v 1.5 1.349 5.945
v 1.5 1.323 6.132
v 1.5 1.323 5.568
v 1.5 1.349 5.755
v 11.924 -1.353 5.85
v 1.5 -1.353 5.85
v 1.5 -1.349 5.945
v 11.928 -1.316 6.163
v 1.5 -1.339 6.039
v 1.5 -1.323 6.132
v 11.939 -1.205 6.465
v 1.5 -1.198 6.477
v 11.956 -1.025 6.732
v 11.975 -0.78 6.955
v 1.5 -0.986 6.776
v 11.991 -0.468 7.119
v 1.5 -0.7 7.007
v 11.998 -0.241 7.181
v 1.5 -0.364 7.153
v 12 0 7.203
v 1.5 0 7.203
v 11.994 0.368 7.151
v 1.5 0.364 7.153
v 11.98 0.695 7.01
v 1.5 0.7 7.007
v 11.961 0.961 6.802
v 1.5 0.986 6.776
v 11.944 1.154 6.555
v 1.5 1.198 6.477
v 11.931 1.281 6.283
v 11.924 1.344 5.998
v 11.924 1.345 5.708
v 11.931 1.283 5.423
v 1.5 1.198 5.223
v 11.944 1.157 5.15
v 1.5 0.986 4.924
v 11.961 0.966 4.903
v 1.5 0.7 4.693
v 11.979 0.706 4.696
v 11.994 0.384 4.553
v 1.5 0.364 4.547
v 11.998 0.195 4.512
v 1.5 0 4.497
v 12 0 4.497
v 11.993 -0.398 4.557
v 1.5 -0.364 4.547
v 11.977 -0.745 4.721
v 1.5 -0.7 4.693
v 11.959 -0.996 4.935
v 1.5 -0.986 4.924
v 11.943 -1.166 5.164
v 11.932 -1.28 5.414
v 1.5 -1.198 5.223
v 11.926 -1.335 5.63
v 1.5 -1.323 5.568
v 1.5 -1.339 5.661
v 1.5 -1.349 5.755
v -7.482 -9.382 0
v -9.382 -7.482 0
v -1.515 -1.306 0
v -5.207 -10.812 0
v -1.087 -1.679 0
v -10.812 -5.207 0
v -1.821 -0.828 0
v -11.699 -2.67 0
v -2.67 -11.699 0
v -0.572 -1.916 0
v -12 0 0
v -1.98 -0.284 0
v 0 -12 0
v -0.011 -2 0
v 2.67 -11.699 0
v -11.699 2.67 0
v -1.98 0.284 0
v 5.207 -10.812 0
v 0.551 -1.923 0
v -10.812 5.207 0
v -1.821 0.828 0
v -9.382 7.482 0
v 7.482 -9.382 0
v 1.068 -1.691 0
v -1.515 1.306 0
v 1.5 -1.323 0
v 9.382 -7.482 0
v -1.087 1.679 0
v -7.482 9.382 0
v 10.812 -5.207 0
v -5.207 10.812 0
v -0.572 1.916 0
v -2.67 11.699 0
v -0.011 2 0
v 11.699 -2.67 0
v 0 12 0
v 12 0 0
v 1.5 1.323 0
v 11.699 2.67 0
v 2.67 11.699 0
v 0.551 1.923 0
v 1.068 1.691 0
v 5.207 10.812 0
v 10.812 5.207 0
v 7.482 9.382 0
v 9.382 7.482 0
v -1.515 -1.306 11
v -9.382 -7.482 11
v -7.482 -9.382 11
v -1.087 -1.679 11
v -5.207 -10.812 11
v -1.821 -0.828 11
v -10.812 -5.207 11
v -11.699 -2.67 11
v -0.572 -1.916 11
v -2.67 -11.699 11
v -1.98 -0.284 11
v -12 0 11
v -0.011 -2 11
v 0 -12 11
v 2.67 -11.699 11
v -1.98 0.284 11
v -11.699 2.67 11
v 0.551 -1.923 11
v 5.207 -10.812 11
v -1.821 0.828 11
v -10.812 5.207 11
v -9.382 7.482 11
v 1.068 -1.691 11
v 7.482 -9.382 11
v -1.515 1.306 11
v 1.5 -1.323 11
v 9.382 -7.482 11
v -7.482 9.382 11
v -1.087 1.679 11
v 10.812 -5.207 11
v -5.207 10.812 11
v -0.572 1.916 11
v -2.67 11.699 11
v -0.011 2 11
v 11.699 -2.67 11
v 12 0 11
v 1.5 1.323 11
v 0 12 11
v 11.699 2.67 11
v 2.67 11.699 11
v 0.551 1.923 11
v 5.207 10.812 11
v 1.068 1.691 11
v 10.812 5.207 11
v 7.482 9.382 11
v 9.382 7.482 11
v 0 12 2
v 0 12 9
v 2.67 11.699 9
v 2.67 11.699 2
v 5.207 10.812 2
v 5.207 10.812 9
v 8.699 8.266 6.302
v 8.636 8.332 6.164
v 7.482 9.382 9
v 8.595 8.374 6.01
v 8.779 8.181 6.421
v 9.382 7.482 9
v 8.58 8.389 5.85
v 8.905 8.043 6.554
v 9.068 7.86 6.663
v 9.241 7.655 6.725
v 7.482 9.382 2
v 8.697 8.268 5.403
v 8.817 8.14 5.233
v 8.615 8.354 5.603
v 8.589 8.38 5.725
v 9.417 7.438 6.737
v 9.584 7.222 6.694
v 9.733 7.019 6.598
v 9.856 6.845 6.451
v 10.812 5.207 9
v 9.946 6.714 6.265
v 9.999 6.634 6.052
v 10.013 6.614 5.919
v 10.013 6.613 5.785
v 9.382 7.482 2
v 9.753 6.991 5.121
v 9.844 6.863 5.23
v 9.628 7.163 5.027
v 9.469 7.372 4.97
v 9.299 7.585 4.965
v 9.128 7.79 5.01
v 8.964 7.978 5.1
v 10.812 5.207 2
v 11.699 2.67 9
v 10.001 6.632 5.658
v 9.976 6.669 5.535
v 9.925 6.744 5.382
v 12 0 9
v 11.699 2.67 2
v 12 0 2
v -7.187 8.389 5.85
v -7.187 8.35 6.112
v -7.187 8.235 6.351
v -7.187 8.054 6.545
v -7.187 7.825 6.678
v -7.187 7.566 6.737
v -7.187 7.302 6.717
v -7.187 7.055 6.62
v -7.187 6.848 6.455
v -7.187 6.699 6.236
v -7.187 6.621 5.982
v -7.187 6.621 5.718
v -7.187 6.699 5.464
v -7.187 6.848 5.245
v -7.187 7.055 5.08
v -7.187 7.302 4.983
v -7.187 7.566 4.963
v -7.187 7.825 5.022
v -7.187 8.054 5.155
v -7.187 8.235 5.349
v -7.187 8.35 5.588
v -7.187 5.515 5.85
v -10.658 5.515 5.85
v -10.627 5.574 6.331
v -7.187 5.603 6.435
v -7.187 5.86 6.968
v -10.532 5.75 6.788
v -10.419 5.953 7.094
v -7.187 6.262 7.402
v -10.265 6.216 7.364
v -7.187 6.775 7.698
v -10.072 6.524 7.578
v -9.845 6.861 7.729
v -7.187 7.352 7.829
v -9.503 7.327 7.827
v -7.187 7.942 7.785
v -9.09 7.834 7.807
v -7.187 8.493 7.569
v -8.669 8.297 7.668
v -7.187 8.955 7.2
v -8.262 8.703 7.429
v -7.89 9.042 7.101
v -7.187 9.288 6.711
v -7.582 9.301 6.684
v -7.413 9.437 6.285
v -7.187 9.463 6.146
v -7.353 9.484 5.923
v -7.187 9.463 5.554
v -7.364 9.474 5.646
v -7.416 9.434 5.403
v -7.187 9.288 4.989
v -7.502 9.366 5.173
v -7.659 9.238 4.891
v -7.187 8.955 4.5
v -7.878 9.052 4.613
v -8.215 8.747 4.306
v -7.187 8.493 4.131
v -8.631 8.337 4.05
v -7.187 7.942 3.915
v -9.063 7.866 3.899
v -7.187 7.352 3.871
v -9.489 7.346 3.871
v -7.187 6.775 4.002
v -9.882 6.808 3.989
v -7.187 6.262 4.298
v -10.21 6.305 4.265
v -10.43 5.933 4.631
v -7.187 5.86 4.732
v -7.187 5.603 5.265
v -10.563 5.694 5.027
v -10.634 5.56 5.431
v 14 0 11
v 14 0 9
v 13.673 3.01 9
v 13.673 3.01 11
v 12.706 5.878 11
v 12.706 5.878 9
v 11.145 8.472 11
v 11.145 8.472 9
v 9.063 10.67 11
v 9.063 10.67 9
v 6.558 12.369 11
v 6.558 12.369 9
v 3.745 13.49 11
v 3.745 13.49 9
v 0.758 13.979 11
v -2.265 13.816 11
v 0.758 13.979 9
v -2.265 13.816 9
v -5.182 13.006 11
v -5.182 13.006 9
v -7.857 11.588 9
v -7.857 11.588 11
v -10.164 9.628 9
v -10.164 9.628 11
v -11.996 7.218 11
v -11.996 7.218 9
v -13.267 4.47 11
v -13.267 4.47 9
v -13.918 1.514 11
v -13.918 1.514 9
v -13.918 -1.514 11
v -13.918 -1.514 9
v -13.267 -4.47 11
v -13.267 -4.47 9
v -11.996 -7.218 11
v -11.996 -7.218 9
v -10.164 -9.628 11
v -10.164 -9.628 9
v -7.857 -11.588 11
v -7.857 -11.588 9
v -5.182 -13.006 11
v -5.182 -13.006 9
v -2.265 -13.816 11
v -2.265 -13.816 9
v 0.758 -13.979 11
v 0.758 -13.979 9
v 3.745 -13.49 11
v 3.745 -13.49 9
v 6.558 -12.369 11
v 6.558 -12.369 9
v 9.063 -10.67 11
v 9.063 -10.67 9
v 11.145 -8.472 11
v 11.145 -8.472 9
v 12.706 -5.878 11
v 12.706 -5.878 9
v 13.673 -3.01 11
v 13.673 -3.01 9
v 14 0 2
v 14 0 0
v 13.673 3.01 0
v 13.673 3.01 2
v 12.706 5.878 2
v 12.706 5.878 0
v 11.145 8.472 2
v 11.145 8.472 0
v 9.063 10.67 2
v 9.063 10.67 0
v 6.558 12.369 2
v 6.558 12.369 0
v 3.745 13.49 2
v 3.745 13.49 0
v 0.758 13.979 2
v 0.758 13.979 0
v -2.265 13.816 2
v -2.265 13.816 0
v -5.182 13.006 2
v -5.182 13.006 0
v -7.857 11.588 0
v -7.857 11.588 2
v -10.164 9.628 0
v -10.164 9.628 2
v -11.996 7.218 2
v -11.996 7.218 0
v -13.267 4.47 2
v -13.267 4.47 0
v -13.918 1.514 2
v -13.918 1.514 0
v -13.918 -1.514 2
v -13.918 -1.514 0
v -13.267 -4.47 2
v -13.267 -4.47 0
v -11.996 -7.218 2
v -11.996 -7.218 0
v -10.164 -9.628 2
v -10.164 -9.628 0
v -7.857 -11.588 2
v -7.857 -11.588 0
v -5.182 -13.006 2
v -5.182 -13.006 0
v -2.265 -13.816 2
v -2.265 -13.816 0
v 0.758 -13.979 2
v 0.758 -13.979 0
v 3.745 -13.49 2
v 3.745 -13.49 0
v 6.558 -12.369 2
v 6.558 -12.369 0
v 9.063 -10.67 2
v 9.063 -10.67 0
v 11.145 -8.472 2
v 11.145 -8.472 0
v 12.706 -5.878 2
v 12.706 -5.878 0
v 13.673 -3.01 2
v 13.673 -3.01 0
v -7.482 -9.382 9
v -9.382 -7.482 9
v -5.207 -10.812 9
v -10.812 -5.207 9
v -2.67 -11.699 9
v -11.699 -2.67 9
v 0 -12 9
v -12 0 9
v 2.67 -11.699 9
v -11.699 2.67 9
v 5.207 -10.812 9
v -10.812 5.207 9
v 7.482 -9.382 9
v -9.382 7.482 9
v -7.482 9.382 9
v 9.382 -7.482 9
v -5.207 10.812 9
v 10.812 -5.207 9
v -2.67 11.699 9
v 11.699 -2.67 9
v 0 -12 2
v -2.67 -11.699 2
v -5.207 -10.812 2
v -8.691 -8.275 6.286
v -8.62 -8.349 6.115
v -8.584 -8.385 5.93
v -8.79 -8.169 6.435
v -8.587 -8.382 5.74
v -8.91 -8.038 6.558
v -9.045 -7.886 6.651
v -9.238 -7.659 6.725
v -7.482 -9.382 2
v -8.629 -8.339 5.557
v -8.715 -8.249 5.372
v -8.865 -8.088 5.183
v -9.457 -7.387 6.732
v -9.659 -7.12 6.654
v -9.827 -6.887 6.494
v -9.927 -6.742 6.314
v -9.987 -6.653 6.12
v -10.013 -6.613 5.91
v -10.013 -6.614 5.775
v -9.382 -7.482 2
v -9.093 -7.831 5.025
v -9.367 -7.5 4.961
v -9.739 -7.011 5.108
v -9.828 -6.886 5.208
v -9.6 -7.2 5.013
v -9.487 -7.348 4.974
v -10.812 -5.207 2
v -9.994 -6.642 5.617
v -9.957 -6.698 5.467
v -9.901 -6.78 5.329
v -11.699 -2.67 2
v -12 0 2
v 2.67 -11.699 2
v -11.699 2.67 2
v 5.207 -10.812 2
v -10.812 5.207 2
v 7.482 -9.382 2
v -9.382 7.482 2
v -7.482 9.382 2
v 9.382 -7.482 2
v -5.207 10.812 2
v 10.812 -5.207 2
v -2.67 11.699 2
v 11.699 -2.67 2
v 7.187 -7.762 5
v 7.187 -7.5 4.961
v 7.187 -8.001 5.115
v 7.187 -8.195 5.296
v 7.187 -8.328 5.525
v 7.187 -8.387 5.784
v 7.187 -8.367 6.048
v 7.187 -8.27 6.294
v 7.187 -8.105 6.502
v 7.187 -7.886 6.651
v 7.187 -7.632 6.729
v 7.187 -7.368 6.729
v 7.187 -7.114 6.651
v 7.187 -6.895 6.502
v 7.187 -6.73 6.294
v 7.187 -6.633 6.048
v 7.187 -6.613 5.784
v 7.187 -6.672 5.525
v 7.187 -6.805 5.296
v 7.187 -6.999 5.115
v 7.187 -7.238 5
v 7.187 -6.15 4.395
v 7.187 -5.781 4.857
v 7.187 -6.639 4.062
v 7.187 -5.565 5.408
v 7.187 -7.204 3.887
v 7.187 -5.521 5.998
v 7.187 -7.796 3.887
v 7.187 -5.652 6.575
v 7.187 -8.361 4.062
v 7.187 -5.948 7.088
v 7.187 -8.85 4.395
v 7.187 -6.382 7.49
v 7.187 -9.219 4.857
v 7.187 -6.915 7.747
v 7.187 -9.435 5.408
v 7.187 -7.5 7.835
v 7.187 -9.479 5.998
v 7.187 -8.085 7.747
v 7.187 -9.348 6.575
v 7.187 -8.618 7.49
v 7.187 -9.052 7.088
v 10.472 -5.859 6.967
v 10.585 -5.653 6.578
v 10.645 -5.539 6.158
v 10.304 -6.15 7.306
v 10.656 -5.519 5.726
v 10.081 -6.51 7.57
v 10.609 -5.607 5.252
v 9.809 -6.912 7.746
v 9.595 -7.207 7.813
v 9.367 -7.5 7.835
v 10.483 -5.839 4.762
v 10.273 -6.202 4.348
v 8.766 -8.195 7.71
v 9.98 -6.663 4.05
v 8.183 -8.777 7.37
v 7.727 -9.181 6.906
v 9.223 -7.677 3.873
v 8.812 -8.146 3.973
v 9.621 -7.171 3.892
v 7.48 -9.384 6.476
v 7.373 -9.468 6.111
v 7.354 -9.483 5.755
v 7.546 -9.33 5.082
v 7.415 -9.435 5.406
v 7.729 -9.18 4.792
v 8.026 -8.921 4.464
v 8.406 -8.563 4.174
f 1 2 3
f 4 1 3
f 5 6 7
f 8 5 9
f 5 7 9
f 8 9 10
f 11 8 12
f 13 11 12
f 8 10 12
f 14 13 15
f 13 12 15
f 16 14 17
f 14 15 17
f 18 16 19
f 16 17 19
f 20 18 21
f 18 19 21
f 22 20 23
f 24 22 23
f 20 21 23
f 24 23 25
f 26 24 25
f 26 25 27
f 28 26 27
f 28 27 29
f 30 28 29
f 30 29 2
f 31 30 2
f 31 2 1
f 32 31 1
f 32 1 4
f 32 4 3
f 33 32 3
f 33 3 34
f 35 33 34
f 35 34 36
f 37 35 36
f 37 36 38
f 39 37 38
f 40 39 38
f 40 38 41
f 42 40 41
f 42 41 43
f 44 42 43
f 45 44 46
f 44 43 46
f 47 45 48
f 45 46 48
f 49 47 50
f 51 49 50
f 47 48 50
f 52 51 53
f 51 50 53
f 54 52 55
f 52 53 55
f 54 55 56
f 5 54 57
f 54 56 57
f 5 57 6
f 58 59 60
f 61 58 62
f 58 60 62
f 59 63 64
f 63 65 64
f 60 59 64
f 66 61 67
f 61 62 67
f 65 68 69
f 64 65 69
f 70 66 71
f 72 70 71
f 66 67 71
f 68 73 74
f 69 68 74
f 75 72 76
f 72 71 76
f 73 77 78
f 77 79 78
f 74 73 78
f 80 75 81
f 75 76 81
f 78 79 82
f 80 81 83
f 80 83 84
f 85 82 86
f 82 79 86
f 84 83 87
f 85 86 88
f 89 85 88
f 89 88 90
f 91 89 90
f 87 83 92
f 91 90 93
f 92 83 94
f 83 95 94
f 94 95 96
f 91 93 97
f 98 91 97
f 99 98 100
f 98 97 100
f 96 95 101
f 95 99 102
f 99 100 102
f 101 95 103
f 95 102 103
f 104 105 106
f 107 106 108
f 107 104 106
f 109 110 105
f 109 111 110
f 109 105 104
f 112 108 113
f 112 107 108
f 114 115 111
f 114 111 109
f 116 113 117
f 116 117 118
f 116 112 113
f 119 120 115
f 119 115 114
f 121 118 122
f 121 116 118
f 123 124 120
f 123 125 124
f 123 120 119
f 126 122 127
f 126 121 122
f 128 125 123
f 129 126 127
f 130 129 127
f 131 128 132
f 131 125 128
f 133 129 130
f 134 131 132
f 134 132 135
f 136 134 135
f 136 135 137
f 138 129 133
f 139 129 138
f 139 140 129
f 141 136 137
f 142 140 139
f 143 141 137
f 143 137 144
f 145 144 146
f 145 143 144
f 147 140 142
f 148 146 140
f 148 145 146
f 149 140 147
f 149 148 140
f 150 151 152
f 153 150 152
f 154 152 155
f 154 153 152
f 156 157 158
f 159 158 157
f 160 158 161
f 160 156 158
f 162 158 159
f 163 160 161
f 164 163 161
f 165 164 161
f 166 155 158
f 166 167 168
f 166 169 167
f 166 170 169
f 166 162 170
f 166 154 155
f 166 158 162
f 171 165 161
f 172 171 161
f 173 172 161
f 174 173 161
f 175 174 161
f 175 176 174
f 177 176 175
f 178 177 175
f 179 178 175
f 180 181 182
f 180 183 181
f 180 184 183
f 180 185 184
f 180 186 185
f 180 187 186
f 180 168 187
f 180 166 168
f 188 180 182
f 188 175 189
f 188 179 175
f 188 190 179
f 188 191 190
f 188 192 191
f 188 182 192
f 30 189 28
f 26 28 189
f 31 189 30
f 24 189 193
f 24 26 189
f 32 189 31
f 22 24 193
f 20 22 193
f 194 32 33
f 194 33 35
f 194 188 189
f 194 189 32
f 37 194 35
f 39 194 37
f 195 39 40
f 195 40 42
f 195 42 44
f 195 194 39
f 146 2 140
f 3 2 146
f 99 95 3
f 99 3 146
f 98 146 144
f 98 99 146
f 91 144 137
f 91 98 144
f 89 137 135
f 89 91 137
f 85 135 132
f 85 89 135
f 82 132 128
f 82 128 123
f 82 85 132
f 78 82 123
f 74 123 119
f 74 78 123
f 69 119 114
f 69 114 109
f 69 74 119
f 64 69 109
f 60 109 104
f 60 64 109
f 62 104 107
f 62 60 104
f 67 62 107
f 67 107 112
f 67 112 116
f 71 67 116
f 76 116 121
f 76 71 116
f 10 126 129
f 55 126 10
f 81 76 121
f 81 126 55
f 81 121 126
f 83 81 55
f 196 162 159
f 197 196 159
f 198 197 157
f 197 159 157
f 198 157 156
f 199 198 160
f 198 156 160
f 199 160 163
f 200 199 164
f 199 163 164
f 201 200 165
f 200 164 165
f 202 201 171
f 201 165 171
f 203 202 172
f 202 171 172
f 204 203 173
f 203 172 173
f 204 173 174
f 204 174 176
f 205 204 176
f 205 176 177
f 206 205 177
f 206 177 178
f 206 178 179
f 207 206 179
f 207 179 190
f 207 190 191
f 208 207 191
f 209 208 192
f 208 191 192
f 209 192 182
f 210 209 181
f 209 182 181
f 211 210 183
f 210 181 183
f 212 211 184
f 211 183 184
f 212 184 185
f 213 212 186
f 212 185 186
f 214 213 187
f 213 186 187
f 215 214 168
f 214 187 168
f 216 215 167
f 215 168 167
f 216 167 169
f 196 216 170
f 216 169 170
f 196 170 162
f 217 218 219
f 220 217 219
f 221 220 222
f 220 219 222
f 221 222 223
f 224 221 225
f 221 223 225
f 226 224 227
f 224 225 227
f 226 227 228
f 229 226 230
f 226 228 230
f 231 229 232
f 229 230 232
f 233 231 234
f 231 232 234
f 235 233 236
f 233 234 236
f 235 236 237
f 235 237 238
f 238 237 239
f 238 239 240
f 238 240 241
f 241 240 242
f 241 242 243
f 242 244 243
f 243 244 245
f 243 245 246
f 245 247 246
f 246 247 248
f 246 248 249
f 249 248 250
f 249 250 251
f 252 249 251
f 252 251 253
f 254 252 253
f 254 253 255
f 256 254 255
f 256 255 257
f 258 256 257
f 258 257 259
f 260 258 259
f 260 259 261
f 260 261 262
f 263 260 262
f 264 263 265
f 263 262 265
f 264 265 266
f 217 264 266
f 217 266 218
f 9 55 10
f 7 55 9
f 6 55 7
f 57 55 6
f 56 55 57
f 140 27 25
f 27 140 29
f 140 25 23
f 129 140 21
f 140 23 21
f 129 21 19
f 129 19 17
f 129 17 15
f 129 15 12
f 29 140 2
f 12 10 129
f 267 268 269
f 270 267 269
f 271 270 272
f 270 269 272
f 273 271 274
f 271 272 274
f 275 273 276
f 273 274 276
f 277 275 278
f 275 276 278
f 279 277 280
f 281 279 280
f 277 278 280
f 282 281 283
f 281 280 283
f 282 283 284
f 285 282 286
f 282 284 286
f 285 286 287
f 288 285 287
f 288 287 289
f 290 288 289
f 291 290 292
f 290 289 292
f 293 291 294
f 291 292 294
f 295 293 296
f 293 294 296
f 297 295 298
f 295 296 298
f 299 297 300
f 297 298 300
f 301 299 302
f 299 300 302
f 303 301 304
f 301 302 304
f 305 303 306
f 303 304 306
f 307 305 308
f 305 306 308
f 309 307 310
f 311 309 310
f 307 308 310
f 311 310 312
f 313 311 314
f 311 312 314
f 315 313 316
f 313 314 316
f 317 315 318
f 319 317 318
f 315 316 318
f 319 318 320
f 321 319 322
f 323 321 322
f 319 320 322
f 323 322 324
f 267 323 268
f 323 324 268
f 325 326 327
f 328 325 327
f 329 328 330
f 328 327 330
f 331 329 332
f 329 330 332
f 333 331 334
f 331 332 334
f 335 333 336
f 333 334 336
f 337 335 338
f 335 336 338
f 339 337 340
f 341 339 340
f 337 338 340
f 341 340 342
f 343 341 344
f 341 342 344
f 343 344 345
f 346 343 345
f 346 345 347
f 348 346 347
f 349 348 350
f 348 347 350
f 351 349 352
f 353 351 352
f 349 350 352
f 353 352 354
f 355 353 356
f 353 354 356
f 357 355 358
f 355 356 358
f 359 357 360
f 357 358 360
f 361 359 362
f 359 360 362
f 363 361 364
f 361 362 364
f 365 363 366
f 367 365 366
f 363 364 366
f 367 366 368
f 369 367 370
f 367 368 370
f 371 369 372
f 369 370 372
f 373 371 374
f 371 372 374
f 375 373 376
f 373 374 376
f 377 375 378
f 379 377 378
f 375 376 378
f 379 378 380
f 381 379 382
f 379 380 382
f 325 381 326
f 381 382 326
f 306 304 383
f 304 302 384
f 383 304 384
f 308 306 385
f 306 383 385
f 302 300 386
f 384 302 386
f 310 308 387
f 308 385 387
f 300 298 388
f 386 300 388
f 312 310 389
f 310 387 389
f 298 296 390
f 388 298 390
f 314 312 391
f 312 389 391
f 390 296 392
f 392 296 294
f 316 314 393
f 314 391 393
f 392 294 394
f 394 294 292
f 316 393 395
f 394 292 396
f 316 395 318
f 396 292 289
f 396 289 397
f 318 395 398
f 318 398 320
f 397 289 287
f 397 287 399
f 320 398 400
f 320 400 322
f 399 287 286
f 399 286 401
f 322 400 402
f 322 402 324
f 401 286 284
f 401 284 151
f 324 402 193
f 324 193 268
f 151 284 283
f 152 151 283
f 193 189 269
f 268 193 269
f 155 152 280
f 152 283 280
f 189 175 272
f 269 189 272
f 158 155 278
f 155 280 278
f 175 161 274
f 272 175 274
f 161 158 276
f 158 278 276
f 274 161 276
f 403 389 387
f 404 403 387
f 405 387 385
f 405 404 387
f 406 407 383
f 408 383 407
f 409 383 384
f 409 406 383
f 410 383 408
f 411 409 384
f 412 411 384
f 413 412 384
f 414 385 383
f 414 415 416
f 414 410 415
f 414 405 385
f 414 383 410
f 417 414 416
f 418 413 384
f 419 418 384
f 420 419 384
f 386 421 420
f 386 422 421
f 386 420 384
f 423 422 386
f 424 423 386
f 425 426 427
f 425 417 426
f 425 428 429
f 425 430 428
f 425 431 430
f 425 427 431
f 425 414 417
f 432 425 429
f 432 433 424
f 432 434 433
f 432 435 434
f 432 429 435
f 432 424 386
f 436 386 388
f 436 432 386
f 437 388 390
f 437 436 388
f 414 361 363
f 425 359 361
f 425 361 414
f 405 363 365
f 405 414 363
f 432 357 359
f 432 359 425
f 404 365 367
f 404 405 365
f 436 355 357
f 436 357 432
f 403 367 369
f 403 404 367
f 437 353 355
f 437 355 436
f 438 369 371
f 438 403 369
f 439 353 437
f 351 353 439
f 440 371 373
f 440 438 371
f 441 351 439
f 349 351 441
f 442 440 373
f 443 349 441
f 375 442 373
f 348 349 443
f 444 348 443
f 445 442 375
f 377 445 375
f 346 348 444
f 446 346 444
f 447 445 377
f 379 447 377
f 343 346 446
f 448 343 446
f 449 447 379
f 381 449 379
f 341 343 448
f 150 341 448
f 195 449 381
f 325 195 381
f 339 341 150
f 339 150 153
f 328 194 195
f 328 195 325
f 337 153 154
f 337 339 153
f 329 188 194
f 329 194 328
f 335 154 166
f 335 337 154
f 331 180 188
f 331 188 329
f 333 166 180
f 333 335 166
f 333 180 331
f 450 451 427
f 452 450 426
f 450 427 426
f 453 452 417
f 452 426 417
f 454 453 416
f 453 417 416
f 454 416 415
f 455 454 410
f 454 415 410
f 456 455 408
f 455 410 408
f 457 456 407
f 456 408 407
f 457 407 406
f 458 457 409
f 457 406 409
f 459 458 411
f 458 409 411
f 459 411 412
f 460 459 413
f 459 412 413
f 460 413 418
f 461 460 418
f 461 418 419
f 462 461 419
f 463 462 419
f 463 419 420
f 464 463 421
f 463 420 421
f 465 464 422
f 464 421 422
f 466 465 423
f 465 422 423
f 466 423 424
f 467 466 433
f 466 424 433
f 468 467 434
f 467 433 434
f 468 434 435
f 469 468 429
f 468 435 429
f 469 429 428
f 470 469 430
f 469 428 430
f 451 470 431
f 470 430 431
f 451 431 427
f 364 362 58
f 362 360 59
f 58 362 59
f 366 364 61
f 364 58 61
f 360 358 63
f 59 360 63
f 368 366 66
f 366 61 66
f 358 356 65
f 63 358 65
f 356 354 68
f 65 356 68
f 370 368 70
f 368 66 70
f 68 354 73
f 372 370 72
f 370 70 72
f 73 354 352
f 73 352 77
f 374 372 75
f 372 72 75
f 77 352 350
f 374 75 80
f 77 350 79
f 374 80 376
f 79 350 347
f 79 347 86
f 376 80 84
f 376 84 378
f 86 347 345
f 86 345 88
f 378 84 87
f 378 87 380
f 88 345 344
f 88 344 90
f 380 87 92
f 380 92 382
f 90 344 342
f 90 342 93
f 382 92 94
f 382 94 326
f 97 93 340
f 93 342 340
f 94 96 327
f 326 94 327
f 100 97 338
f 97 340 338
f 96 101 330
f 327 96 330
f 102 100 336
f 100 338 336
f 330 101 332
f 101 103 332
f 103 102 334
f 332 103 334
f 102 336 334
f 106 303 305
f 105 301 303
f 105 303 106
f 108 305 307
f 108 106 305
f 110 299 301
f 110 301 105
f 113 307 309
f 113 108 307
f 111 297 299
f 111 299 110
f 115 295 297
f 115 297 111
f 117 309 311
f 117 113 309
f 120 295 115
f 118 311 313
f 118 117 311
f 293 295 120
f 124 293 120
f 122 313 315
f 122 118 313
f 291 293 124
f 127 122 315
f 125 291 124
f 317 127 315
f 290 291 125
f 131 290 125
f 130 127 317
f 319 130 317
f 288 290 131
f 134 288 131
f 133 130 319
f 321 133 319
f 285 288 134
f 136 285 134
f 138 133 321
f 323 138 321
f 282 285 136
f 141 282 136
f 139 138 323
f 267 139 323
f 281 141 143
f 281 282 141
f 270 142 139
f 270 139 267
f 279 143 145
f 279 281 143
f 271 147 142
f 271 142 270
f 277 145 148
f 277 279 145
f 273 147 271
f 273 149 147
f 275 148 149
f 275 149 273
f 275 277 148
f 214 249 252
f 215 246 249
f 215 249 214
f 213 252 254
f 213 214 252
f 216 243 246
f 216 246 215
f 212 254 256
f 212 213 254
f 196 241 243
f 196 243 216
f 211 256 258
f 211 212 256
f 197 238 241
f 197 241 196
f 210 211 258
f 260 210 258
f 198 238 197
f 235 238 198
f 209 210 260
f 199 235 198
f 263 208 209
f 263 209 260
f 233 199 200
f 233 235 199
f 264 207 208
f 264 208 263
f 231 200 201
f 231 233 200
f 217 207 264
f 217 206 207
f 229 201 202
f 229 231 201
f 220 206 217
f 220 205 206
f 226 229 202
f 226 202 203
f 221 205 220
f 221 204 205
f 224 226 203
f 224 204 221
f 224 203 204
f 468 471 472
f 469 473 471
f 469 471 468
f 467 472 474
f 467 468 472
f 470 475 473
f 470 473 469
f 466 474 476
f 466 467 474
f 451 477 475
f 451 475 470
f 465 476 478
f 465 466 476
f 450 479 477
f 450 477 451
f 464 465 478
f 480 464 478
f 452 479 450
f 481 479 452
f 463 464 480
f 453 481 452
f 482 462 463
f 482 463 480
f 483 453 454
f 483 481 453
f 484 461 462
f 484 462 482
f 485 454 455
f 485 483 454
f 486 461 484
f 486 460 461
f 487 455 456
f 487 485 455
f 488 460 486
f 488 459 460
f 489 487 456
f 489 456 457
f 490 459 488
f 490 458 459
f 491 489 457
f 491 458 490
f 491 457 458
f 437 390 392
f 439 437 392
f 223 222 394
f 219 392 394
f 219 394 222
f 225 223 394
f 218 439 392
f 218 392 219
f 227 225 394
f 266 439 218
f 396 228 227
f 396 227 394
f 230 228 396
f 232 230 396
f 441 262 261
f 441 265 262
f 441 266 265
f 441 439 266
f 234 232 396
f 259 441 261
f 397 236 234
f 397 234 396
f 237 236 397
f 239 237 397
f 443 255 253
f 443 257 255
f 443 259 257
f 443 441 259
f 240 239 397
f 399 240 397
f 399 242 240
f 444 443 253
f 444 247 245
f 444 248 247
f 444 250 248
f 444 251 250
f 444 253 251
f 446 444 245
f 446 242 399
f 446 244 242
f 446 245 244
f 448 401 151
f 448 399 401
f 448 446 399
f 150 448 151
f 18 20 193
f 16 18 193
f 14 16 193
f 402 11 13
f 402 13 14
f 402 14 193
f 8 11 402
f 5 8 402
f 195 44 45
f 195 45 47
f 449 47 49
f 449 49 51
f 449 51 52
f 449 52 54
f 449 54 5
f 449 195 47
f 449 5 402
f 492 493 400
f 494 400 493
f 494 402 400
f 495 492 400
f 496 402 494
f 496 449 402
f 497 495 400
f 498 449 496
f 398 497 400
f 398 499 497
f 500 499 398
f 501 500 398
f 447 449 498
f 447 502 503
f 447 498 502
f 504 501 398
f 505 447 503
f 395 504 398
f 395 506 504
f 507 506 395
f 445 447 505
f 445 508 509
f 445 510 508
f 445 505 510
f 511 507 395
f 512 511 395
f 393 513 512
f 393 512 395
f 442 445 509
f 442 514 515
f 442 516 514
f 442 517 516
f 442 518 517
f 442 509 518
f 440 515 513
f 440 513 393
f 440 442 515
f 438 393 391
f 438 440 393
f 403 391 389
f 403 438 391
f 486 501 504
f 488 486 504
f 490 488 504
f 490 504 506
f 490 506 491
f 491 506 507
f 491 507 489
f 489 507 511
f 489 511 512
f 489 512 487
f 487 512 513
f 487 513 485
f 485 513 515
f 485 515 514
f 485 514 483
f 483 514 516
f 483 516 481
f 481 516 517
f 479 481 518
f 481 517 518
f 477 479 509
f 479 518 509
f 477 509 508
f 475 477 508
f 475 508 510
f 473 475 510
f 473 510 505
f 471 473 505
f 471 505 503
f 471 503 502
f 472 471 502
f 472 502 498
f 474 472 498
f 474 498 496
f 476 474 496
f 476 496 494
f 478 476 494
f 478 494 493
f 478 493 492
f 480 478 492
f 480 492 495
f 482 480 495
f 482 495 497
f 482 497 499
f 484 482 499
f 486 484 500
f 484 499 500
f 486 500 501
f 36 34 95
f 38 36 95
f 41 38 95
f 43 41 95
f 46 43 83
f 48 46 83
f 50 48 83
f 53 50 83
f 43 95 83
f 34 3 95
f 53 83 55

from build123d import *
from build123d.topology import SkipClean

# Parameters (mm, degrees)
SKETCH1_R                                           = 12
SKETCH1_R_2                                         = 2
SQUARE_BODY_DEPTH                                   = 11
CBORE_FOR_0_BINDING_HEAD_MACHINE_SCREW1_D           = 1.778
CBORE_FOR_0_BINDING_HEAD_MACHINE_SCREW1_CBORE_D     = 3.97002
CBORE_FOR_0_BINDING_HEAD_MACHINE_SCREW1_CBORE_DEPTH = 4.812792
CBORE_FOR_0_BINDING_HEAD_MACHINE_SC_2_D             = 1.778
CBORE_FOR_0_BINDING_HEAD_MACHINE_SC_2_CBORE_D       = 3.97002
CBORE_FOR_0_BINDING_HEAD_MACHINE_SC_2_CBORE_DEPTH   = 4.812792
F_6_32_TAPPED_HOLE2_D                               = 2.7051
F_6_32_TAPPED_HOLE2_DEPTH                           = 10.5
CENTER_SPINDLE_DEPTH                                = 21.223748416
SKETCH1_3_R                                         = 14
SKETCH1_3_R_2                                       = 12
TOP_FLANGE_DEPTH                                    = 2
BOTTOM_START                                        = 9
SKETCH1_4_R                                         = 14
SKETCH1_4_R_2                                       = 12
BOTTOM_FLANGE_DEPTH                                 = 2


with BuildPart() as part:
    # Sketch1 → Square Body (new body)
    # profile 1 of 10: a face of its own
    with BuildSketch(Plane.XY):
        Circle(SKETCH1_R)
        Circle(SKETCH1_R_2, mode=Mode.SUBTRACT)
    # profile 2 of 10: a face of its own
    with BuildSketch(Plane.XY):
        with BuildLine():
            Line((-12, 7.211102551), (-12, 0))
            ThreePointArc((-12, 0), (-8.485281374, 8.485281374), (0, 12))
            Line((0, 12), (-7.211102551, 12))
            ThreePointArc((-7.211102551, 12), (-9.899494937, 9.899494937), (-12, 7.211102551))
        make_face()
    # profile 3 of 10: a face of its own
    with BuildSketch(Plane.XY):
        with BuildLine():
            Line((-12, 12), (-12, 7.211102551))
            ThreePointArc((-12, 7.211102551), (-9.899494937, 9.899494937), (-7.211102551, 12))
            Line((-7.211102551, 12), (-12, 12))
        make_face()
    # profile 4 of 10: a face of its own
    with BuildSketch(Plane.XY):
        with BuildLine():
            ThreePointArc((0, -12), (-8.485281374, -8.485281374), (-12, 0))
            Line((-12, 0), (-12, -7.211102551))
            ThreePointArc((-12, -7.211102551), (-9.899494937, -9.899494937), (-7.211102551, -12))
            Line((-7.211102551, -12), (0, -12))
        make_face()
    # profile 5 of 10: a face of its own
    with BuildSketch(Plane.XY):
        with BuildLine():
            ThreePointArc((-7.211102551, -12), (-9.899494937, -9.899494937), (-12, -7.211102551))
            Line((-12, -7.211102551), (-12, -12))
            Line((-12, -12), (-7.211102551, -12))
        make_face()
    # profile 6 of 10: a face of its own
    with BuildSketch(Plane.XY):
        with BuildLine():
            ThreePointArc((12, 0), (8.485281374, -8.485281374), (0, -12))
            Line((0, -12), (7.211102551, -12))
            ThreePointArc((7.211102551, -12), (9.899494937, -9.899494937), (12, -7.211102551))
            Line((12, -7.211102551), (12, 0))
        make_face()
    # profile 7 of 10: a face of its own
    with BuildSketch(Plane.XY):
        with BuildLine():
            ThreePointArc((12, -7.211102551), (9.899494937, -9.899494937), (7.211102551, -12))
            Line((7.211102551, -12), (12, -12))
            Line((12, -12), (12, -7.211102551))
        make_face()
    # profile 8 of 10: a face of its own
    with BuildSketch(Plane.XY):
        with BuildLine():
            Line((7.211102551, 12), (0, 12))
            ThreePointArc((0, 12), (8.485281374, 8.485281374), (12, 0))
            Line((12, 0), (12, 7.211102551))
            ThreePointArc((12, 7.211102551), (9.899494937, 9.899494937), (7.211102551, 12))
        make_face()
    # profile 9 of 10: a face of its own
    with BuildSketch(Plane.XY):
        with BuildLine():
            Line((12, 12), (7.211102551, 12))
            ThreePointArc((7.211102551, 12), (9.899494937, 9.899494937), (12, 7.211102551))
            Line((12, 7.211102551), (12, 12))
        make_face()
    # profile 10 of 10: a face of its own
    with BuildSketch(Plane.XY):
        with BuildLine():
            ThreePointArc((2, 0), (1.870828693, 0.707106781), (1.5, 1.322875656))
            Line((1.5, 1.322875656), (1.5, -1.322875656))
            ThreePointArc((1.5, -1.322875656), (1.870828693, -0.707106781), (2, 0))
        make_face()
    extrude(amount=SQUARE_BODY_DEPTH)

    # CBORE for #0 Binding Head Machine Screw1 (through all)
    with Locations(Plane(origin=(-12, 7.5, 5.85), x_dir=(0, -1, 0), z_dir=(-1, 0, 0))):
        with Locations((0, 0)):
            CounterBoreHole(CBORE_FOR_0_BINDING_HEAD_MACHINE_SCREW1_D / 2, CBORE_FOR_0_BINDING_HEAD_MACHINE_SCREW1_CBORE_D / 2, CBORE_FOR_0_BINDING_HEAD_MACHINE_SCREW1_CBORE_DEPTH)

    # CBORE for _0 Binding Head Machine Sc 2 (through all)
    with Locations(Plane(origin=(12, -7.5, 5.85), x_dir=(0, 0, 1), z_dir=(1, 0, 0))):
        with Locations((0, 0)):
            CounterBoreHole(CBORE_FOR_0_BINDING_HEAD_MACHINE_SC_2_D / 2, CBORE_FOR_0_BINDING_HEAD_MACHINE_SC_2_CBORE_D / 2, CBORE_FOR_0_BINDING_HEAD_MACHINE_SC_2_CBORE_DEPTH)

    # #6-32 Tapped Hole2
    with Locations(Plane(origin=(12, 0, 5.85), x_dir=(0, 1, 0), z_dir=(1, 0, 0))):
        with Locations((0, 0)):
            Hole(F_6_32_TAPPED_HOLE2_D / 2, depth=F_6_32_TAPPED_HOLE2_DEPTH)

    # Sketch1<5> → Center Spindle (cut, through all)
    with SkipClean():  # the faces are left unmerged after this step: merging them gives an invalid solid
        with BuildSketch(Plane.XY):
            with BuildLine():
                ThreePointArc((0, -12), (-8.485281374, -8.485281374), (-12, 0))
                Line((-12, 0), (-12, -7.211102551))
                ThreePointArc((-12, -7.211102551), (-9.899494937, -9.899494937), (-7.211102551, -12))
                Line((-7.211102551, -12), (0, -12))
            make_face()
            with BuildLine():
                ThreePointArc((-7.211102551, -12), (-9.899494937, -9.899494937), (-12, -7.211102551))
                Line((-12, -7.211102551), (-12, -12))
                Line((-12, -12), (-7.211102551, -12))
            make_face()
            with BuildLine():
                Line((-12, 7.211102551), (-12, 0))
                ThreePointArc((-12, 0), (-8.485281374, 8.485281374), (0, 12))
                Line((0, 12), (-7.211102551, 12))
                ThreePointArc((-7.211102551, 12), (-9.899494937, 9.899494937), (-12, 7.211102551))
            make_face()
            with BuildLine():
                Line((-12, 12), (-12, 7.211102551))
                ThreePointArc((-12, 7.211102551), (-9.899494937, 9.899494937), (-7.211102551, 12))
                Line((-7.211102551, 12), (-12, 12))
            make_face()
            with BuildLine():
                Line((7.211102551, 12), (0, 12))
                ThreePointArc((0, 12), (8.485281374, 8.485281374), (12, 0))
                Line((12, 0), (12, 7.211102551))
                ThreePointArc((12, 7.211102551), (9.899494937, 9.899494937), (7.211102551, 12))
            make_face()
            with BuildLine():
                Line((12, 12), (7.211102551, 12))
                ThreePointArc((7.211102551, 12), (9.899494937, 9.899494937), (12, 7.211102551))
                Line((12, 7.211102551), (12, 12))
            make_face()
            with BuildLine():
                ThreePointArc((12, 0), (8.485281374, -8.485281374), (0, -12))
                Line((0, -12), (7.211102551, -12))
                ThreePointArc((7.211102551, -12), (9.899494937, -9.899494937), (12, -7.211102551))
                Line((12, -7.211102551), (12, 0))
            make_face()
            with BuildLine():
                ThreePointArc((12, -7.211102551), (9.899494937, -9.899494937), (7.211102551, -12))
                Line((7.211102551, -12), (12, -12))
                Line((12, -12), (12, -7.211102551))
            make_face()
        extrude(amount=CENTER_SPINDLE_DEPTH, mode=Mode.SUBTRACT)

    # Sketch1<3> → Top Flange (add)
    with SkipClean():  # the faces are left unmerged after this step: merging them gives an invalid solid
        with BuildSketch(Plane.XY):
            Circle(SKETCH1_3_R)
            Circle(SKETCH1_3_R_2, mode=Mode.SUBTRACT)
        extrude(amount=TOP_FLANGE_DEPTH)

    # Sketch1<4> → Bottom Flange (add)
    with SkipClean():  # the faces are left unmerged after this step: merging them gives an invalid solid
        with BuildSketch(Plane.XY.offset(BOTTOM_START)):
            Circle(SKETCH1_4_R)
            Circle(SKETCH1_4_R_2, mode=Mode.SUBTRACT)
        extrude(amount=BOTTOM_FLANGE_DEPTH)


solid = part.part
